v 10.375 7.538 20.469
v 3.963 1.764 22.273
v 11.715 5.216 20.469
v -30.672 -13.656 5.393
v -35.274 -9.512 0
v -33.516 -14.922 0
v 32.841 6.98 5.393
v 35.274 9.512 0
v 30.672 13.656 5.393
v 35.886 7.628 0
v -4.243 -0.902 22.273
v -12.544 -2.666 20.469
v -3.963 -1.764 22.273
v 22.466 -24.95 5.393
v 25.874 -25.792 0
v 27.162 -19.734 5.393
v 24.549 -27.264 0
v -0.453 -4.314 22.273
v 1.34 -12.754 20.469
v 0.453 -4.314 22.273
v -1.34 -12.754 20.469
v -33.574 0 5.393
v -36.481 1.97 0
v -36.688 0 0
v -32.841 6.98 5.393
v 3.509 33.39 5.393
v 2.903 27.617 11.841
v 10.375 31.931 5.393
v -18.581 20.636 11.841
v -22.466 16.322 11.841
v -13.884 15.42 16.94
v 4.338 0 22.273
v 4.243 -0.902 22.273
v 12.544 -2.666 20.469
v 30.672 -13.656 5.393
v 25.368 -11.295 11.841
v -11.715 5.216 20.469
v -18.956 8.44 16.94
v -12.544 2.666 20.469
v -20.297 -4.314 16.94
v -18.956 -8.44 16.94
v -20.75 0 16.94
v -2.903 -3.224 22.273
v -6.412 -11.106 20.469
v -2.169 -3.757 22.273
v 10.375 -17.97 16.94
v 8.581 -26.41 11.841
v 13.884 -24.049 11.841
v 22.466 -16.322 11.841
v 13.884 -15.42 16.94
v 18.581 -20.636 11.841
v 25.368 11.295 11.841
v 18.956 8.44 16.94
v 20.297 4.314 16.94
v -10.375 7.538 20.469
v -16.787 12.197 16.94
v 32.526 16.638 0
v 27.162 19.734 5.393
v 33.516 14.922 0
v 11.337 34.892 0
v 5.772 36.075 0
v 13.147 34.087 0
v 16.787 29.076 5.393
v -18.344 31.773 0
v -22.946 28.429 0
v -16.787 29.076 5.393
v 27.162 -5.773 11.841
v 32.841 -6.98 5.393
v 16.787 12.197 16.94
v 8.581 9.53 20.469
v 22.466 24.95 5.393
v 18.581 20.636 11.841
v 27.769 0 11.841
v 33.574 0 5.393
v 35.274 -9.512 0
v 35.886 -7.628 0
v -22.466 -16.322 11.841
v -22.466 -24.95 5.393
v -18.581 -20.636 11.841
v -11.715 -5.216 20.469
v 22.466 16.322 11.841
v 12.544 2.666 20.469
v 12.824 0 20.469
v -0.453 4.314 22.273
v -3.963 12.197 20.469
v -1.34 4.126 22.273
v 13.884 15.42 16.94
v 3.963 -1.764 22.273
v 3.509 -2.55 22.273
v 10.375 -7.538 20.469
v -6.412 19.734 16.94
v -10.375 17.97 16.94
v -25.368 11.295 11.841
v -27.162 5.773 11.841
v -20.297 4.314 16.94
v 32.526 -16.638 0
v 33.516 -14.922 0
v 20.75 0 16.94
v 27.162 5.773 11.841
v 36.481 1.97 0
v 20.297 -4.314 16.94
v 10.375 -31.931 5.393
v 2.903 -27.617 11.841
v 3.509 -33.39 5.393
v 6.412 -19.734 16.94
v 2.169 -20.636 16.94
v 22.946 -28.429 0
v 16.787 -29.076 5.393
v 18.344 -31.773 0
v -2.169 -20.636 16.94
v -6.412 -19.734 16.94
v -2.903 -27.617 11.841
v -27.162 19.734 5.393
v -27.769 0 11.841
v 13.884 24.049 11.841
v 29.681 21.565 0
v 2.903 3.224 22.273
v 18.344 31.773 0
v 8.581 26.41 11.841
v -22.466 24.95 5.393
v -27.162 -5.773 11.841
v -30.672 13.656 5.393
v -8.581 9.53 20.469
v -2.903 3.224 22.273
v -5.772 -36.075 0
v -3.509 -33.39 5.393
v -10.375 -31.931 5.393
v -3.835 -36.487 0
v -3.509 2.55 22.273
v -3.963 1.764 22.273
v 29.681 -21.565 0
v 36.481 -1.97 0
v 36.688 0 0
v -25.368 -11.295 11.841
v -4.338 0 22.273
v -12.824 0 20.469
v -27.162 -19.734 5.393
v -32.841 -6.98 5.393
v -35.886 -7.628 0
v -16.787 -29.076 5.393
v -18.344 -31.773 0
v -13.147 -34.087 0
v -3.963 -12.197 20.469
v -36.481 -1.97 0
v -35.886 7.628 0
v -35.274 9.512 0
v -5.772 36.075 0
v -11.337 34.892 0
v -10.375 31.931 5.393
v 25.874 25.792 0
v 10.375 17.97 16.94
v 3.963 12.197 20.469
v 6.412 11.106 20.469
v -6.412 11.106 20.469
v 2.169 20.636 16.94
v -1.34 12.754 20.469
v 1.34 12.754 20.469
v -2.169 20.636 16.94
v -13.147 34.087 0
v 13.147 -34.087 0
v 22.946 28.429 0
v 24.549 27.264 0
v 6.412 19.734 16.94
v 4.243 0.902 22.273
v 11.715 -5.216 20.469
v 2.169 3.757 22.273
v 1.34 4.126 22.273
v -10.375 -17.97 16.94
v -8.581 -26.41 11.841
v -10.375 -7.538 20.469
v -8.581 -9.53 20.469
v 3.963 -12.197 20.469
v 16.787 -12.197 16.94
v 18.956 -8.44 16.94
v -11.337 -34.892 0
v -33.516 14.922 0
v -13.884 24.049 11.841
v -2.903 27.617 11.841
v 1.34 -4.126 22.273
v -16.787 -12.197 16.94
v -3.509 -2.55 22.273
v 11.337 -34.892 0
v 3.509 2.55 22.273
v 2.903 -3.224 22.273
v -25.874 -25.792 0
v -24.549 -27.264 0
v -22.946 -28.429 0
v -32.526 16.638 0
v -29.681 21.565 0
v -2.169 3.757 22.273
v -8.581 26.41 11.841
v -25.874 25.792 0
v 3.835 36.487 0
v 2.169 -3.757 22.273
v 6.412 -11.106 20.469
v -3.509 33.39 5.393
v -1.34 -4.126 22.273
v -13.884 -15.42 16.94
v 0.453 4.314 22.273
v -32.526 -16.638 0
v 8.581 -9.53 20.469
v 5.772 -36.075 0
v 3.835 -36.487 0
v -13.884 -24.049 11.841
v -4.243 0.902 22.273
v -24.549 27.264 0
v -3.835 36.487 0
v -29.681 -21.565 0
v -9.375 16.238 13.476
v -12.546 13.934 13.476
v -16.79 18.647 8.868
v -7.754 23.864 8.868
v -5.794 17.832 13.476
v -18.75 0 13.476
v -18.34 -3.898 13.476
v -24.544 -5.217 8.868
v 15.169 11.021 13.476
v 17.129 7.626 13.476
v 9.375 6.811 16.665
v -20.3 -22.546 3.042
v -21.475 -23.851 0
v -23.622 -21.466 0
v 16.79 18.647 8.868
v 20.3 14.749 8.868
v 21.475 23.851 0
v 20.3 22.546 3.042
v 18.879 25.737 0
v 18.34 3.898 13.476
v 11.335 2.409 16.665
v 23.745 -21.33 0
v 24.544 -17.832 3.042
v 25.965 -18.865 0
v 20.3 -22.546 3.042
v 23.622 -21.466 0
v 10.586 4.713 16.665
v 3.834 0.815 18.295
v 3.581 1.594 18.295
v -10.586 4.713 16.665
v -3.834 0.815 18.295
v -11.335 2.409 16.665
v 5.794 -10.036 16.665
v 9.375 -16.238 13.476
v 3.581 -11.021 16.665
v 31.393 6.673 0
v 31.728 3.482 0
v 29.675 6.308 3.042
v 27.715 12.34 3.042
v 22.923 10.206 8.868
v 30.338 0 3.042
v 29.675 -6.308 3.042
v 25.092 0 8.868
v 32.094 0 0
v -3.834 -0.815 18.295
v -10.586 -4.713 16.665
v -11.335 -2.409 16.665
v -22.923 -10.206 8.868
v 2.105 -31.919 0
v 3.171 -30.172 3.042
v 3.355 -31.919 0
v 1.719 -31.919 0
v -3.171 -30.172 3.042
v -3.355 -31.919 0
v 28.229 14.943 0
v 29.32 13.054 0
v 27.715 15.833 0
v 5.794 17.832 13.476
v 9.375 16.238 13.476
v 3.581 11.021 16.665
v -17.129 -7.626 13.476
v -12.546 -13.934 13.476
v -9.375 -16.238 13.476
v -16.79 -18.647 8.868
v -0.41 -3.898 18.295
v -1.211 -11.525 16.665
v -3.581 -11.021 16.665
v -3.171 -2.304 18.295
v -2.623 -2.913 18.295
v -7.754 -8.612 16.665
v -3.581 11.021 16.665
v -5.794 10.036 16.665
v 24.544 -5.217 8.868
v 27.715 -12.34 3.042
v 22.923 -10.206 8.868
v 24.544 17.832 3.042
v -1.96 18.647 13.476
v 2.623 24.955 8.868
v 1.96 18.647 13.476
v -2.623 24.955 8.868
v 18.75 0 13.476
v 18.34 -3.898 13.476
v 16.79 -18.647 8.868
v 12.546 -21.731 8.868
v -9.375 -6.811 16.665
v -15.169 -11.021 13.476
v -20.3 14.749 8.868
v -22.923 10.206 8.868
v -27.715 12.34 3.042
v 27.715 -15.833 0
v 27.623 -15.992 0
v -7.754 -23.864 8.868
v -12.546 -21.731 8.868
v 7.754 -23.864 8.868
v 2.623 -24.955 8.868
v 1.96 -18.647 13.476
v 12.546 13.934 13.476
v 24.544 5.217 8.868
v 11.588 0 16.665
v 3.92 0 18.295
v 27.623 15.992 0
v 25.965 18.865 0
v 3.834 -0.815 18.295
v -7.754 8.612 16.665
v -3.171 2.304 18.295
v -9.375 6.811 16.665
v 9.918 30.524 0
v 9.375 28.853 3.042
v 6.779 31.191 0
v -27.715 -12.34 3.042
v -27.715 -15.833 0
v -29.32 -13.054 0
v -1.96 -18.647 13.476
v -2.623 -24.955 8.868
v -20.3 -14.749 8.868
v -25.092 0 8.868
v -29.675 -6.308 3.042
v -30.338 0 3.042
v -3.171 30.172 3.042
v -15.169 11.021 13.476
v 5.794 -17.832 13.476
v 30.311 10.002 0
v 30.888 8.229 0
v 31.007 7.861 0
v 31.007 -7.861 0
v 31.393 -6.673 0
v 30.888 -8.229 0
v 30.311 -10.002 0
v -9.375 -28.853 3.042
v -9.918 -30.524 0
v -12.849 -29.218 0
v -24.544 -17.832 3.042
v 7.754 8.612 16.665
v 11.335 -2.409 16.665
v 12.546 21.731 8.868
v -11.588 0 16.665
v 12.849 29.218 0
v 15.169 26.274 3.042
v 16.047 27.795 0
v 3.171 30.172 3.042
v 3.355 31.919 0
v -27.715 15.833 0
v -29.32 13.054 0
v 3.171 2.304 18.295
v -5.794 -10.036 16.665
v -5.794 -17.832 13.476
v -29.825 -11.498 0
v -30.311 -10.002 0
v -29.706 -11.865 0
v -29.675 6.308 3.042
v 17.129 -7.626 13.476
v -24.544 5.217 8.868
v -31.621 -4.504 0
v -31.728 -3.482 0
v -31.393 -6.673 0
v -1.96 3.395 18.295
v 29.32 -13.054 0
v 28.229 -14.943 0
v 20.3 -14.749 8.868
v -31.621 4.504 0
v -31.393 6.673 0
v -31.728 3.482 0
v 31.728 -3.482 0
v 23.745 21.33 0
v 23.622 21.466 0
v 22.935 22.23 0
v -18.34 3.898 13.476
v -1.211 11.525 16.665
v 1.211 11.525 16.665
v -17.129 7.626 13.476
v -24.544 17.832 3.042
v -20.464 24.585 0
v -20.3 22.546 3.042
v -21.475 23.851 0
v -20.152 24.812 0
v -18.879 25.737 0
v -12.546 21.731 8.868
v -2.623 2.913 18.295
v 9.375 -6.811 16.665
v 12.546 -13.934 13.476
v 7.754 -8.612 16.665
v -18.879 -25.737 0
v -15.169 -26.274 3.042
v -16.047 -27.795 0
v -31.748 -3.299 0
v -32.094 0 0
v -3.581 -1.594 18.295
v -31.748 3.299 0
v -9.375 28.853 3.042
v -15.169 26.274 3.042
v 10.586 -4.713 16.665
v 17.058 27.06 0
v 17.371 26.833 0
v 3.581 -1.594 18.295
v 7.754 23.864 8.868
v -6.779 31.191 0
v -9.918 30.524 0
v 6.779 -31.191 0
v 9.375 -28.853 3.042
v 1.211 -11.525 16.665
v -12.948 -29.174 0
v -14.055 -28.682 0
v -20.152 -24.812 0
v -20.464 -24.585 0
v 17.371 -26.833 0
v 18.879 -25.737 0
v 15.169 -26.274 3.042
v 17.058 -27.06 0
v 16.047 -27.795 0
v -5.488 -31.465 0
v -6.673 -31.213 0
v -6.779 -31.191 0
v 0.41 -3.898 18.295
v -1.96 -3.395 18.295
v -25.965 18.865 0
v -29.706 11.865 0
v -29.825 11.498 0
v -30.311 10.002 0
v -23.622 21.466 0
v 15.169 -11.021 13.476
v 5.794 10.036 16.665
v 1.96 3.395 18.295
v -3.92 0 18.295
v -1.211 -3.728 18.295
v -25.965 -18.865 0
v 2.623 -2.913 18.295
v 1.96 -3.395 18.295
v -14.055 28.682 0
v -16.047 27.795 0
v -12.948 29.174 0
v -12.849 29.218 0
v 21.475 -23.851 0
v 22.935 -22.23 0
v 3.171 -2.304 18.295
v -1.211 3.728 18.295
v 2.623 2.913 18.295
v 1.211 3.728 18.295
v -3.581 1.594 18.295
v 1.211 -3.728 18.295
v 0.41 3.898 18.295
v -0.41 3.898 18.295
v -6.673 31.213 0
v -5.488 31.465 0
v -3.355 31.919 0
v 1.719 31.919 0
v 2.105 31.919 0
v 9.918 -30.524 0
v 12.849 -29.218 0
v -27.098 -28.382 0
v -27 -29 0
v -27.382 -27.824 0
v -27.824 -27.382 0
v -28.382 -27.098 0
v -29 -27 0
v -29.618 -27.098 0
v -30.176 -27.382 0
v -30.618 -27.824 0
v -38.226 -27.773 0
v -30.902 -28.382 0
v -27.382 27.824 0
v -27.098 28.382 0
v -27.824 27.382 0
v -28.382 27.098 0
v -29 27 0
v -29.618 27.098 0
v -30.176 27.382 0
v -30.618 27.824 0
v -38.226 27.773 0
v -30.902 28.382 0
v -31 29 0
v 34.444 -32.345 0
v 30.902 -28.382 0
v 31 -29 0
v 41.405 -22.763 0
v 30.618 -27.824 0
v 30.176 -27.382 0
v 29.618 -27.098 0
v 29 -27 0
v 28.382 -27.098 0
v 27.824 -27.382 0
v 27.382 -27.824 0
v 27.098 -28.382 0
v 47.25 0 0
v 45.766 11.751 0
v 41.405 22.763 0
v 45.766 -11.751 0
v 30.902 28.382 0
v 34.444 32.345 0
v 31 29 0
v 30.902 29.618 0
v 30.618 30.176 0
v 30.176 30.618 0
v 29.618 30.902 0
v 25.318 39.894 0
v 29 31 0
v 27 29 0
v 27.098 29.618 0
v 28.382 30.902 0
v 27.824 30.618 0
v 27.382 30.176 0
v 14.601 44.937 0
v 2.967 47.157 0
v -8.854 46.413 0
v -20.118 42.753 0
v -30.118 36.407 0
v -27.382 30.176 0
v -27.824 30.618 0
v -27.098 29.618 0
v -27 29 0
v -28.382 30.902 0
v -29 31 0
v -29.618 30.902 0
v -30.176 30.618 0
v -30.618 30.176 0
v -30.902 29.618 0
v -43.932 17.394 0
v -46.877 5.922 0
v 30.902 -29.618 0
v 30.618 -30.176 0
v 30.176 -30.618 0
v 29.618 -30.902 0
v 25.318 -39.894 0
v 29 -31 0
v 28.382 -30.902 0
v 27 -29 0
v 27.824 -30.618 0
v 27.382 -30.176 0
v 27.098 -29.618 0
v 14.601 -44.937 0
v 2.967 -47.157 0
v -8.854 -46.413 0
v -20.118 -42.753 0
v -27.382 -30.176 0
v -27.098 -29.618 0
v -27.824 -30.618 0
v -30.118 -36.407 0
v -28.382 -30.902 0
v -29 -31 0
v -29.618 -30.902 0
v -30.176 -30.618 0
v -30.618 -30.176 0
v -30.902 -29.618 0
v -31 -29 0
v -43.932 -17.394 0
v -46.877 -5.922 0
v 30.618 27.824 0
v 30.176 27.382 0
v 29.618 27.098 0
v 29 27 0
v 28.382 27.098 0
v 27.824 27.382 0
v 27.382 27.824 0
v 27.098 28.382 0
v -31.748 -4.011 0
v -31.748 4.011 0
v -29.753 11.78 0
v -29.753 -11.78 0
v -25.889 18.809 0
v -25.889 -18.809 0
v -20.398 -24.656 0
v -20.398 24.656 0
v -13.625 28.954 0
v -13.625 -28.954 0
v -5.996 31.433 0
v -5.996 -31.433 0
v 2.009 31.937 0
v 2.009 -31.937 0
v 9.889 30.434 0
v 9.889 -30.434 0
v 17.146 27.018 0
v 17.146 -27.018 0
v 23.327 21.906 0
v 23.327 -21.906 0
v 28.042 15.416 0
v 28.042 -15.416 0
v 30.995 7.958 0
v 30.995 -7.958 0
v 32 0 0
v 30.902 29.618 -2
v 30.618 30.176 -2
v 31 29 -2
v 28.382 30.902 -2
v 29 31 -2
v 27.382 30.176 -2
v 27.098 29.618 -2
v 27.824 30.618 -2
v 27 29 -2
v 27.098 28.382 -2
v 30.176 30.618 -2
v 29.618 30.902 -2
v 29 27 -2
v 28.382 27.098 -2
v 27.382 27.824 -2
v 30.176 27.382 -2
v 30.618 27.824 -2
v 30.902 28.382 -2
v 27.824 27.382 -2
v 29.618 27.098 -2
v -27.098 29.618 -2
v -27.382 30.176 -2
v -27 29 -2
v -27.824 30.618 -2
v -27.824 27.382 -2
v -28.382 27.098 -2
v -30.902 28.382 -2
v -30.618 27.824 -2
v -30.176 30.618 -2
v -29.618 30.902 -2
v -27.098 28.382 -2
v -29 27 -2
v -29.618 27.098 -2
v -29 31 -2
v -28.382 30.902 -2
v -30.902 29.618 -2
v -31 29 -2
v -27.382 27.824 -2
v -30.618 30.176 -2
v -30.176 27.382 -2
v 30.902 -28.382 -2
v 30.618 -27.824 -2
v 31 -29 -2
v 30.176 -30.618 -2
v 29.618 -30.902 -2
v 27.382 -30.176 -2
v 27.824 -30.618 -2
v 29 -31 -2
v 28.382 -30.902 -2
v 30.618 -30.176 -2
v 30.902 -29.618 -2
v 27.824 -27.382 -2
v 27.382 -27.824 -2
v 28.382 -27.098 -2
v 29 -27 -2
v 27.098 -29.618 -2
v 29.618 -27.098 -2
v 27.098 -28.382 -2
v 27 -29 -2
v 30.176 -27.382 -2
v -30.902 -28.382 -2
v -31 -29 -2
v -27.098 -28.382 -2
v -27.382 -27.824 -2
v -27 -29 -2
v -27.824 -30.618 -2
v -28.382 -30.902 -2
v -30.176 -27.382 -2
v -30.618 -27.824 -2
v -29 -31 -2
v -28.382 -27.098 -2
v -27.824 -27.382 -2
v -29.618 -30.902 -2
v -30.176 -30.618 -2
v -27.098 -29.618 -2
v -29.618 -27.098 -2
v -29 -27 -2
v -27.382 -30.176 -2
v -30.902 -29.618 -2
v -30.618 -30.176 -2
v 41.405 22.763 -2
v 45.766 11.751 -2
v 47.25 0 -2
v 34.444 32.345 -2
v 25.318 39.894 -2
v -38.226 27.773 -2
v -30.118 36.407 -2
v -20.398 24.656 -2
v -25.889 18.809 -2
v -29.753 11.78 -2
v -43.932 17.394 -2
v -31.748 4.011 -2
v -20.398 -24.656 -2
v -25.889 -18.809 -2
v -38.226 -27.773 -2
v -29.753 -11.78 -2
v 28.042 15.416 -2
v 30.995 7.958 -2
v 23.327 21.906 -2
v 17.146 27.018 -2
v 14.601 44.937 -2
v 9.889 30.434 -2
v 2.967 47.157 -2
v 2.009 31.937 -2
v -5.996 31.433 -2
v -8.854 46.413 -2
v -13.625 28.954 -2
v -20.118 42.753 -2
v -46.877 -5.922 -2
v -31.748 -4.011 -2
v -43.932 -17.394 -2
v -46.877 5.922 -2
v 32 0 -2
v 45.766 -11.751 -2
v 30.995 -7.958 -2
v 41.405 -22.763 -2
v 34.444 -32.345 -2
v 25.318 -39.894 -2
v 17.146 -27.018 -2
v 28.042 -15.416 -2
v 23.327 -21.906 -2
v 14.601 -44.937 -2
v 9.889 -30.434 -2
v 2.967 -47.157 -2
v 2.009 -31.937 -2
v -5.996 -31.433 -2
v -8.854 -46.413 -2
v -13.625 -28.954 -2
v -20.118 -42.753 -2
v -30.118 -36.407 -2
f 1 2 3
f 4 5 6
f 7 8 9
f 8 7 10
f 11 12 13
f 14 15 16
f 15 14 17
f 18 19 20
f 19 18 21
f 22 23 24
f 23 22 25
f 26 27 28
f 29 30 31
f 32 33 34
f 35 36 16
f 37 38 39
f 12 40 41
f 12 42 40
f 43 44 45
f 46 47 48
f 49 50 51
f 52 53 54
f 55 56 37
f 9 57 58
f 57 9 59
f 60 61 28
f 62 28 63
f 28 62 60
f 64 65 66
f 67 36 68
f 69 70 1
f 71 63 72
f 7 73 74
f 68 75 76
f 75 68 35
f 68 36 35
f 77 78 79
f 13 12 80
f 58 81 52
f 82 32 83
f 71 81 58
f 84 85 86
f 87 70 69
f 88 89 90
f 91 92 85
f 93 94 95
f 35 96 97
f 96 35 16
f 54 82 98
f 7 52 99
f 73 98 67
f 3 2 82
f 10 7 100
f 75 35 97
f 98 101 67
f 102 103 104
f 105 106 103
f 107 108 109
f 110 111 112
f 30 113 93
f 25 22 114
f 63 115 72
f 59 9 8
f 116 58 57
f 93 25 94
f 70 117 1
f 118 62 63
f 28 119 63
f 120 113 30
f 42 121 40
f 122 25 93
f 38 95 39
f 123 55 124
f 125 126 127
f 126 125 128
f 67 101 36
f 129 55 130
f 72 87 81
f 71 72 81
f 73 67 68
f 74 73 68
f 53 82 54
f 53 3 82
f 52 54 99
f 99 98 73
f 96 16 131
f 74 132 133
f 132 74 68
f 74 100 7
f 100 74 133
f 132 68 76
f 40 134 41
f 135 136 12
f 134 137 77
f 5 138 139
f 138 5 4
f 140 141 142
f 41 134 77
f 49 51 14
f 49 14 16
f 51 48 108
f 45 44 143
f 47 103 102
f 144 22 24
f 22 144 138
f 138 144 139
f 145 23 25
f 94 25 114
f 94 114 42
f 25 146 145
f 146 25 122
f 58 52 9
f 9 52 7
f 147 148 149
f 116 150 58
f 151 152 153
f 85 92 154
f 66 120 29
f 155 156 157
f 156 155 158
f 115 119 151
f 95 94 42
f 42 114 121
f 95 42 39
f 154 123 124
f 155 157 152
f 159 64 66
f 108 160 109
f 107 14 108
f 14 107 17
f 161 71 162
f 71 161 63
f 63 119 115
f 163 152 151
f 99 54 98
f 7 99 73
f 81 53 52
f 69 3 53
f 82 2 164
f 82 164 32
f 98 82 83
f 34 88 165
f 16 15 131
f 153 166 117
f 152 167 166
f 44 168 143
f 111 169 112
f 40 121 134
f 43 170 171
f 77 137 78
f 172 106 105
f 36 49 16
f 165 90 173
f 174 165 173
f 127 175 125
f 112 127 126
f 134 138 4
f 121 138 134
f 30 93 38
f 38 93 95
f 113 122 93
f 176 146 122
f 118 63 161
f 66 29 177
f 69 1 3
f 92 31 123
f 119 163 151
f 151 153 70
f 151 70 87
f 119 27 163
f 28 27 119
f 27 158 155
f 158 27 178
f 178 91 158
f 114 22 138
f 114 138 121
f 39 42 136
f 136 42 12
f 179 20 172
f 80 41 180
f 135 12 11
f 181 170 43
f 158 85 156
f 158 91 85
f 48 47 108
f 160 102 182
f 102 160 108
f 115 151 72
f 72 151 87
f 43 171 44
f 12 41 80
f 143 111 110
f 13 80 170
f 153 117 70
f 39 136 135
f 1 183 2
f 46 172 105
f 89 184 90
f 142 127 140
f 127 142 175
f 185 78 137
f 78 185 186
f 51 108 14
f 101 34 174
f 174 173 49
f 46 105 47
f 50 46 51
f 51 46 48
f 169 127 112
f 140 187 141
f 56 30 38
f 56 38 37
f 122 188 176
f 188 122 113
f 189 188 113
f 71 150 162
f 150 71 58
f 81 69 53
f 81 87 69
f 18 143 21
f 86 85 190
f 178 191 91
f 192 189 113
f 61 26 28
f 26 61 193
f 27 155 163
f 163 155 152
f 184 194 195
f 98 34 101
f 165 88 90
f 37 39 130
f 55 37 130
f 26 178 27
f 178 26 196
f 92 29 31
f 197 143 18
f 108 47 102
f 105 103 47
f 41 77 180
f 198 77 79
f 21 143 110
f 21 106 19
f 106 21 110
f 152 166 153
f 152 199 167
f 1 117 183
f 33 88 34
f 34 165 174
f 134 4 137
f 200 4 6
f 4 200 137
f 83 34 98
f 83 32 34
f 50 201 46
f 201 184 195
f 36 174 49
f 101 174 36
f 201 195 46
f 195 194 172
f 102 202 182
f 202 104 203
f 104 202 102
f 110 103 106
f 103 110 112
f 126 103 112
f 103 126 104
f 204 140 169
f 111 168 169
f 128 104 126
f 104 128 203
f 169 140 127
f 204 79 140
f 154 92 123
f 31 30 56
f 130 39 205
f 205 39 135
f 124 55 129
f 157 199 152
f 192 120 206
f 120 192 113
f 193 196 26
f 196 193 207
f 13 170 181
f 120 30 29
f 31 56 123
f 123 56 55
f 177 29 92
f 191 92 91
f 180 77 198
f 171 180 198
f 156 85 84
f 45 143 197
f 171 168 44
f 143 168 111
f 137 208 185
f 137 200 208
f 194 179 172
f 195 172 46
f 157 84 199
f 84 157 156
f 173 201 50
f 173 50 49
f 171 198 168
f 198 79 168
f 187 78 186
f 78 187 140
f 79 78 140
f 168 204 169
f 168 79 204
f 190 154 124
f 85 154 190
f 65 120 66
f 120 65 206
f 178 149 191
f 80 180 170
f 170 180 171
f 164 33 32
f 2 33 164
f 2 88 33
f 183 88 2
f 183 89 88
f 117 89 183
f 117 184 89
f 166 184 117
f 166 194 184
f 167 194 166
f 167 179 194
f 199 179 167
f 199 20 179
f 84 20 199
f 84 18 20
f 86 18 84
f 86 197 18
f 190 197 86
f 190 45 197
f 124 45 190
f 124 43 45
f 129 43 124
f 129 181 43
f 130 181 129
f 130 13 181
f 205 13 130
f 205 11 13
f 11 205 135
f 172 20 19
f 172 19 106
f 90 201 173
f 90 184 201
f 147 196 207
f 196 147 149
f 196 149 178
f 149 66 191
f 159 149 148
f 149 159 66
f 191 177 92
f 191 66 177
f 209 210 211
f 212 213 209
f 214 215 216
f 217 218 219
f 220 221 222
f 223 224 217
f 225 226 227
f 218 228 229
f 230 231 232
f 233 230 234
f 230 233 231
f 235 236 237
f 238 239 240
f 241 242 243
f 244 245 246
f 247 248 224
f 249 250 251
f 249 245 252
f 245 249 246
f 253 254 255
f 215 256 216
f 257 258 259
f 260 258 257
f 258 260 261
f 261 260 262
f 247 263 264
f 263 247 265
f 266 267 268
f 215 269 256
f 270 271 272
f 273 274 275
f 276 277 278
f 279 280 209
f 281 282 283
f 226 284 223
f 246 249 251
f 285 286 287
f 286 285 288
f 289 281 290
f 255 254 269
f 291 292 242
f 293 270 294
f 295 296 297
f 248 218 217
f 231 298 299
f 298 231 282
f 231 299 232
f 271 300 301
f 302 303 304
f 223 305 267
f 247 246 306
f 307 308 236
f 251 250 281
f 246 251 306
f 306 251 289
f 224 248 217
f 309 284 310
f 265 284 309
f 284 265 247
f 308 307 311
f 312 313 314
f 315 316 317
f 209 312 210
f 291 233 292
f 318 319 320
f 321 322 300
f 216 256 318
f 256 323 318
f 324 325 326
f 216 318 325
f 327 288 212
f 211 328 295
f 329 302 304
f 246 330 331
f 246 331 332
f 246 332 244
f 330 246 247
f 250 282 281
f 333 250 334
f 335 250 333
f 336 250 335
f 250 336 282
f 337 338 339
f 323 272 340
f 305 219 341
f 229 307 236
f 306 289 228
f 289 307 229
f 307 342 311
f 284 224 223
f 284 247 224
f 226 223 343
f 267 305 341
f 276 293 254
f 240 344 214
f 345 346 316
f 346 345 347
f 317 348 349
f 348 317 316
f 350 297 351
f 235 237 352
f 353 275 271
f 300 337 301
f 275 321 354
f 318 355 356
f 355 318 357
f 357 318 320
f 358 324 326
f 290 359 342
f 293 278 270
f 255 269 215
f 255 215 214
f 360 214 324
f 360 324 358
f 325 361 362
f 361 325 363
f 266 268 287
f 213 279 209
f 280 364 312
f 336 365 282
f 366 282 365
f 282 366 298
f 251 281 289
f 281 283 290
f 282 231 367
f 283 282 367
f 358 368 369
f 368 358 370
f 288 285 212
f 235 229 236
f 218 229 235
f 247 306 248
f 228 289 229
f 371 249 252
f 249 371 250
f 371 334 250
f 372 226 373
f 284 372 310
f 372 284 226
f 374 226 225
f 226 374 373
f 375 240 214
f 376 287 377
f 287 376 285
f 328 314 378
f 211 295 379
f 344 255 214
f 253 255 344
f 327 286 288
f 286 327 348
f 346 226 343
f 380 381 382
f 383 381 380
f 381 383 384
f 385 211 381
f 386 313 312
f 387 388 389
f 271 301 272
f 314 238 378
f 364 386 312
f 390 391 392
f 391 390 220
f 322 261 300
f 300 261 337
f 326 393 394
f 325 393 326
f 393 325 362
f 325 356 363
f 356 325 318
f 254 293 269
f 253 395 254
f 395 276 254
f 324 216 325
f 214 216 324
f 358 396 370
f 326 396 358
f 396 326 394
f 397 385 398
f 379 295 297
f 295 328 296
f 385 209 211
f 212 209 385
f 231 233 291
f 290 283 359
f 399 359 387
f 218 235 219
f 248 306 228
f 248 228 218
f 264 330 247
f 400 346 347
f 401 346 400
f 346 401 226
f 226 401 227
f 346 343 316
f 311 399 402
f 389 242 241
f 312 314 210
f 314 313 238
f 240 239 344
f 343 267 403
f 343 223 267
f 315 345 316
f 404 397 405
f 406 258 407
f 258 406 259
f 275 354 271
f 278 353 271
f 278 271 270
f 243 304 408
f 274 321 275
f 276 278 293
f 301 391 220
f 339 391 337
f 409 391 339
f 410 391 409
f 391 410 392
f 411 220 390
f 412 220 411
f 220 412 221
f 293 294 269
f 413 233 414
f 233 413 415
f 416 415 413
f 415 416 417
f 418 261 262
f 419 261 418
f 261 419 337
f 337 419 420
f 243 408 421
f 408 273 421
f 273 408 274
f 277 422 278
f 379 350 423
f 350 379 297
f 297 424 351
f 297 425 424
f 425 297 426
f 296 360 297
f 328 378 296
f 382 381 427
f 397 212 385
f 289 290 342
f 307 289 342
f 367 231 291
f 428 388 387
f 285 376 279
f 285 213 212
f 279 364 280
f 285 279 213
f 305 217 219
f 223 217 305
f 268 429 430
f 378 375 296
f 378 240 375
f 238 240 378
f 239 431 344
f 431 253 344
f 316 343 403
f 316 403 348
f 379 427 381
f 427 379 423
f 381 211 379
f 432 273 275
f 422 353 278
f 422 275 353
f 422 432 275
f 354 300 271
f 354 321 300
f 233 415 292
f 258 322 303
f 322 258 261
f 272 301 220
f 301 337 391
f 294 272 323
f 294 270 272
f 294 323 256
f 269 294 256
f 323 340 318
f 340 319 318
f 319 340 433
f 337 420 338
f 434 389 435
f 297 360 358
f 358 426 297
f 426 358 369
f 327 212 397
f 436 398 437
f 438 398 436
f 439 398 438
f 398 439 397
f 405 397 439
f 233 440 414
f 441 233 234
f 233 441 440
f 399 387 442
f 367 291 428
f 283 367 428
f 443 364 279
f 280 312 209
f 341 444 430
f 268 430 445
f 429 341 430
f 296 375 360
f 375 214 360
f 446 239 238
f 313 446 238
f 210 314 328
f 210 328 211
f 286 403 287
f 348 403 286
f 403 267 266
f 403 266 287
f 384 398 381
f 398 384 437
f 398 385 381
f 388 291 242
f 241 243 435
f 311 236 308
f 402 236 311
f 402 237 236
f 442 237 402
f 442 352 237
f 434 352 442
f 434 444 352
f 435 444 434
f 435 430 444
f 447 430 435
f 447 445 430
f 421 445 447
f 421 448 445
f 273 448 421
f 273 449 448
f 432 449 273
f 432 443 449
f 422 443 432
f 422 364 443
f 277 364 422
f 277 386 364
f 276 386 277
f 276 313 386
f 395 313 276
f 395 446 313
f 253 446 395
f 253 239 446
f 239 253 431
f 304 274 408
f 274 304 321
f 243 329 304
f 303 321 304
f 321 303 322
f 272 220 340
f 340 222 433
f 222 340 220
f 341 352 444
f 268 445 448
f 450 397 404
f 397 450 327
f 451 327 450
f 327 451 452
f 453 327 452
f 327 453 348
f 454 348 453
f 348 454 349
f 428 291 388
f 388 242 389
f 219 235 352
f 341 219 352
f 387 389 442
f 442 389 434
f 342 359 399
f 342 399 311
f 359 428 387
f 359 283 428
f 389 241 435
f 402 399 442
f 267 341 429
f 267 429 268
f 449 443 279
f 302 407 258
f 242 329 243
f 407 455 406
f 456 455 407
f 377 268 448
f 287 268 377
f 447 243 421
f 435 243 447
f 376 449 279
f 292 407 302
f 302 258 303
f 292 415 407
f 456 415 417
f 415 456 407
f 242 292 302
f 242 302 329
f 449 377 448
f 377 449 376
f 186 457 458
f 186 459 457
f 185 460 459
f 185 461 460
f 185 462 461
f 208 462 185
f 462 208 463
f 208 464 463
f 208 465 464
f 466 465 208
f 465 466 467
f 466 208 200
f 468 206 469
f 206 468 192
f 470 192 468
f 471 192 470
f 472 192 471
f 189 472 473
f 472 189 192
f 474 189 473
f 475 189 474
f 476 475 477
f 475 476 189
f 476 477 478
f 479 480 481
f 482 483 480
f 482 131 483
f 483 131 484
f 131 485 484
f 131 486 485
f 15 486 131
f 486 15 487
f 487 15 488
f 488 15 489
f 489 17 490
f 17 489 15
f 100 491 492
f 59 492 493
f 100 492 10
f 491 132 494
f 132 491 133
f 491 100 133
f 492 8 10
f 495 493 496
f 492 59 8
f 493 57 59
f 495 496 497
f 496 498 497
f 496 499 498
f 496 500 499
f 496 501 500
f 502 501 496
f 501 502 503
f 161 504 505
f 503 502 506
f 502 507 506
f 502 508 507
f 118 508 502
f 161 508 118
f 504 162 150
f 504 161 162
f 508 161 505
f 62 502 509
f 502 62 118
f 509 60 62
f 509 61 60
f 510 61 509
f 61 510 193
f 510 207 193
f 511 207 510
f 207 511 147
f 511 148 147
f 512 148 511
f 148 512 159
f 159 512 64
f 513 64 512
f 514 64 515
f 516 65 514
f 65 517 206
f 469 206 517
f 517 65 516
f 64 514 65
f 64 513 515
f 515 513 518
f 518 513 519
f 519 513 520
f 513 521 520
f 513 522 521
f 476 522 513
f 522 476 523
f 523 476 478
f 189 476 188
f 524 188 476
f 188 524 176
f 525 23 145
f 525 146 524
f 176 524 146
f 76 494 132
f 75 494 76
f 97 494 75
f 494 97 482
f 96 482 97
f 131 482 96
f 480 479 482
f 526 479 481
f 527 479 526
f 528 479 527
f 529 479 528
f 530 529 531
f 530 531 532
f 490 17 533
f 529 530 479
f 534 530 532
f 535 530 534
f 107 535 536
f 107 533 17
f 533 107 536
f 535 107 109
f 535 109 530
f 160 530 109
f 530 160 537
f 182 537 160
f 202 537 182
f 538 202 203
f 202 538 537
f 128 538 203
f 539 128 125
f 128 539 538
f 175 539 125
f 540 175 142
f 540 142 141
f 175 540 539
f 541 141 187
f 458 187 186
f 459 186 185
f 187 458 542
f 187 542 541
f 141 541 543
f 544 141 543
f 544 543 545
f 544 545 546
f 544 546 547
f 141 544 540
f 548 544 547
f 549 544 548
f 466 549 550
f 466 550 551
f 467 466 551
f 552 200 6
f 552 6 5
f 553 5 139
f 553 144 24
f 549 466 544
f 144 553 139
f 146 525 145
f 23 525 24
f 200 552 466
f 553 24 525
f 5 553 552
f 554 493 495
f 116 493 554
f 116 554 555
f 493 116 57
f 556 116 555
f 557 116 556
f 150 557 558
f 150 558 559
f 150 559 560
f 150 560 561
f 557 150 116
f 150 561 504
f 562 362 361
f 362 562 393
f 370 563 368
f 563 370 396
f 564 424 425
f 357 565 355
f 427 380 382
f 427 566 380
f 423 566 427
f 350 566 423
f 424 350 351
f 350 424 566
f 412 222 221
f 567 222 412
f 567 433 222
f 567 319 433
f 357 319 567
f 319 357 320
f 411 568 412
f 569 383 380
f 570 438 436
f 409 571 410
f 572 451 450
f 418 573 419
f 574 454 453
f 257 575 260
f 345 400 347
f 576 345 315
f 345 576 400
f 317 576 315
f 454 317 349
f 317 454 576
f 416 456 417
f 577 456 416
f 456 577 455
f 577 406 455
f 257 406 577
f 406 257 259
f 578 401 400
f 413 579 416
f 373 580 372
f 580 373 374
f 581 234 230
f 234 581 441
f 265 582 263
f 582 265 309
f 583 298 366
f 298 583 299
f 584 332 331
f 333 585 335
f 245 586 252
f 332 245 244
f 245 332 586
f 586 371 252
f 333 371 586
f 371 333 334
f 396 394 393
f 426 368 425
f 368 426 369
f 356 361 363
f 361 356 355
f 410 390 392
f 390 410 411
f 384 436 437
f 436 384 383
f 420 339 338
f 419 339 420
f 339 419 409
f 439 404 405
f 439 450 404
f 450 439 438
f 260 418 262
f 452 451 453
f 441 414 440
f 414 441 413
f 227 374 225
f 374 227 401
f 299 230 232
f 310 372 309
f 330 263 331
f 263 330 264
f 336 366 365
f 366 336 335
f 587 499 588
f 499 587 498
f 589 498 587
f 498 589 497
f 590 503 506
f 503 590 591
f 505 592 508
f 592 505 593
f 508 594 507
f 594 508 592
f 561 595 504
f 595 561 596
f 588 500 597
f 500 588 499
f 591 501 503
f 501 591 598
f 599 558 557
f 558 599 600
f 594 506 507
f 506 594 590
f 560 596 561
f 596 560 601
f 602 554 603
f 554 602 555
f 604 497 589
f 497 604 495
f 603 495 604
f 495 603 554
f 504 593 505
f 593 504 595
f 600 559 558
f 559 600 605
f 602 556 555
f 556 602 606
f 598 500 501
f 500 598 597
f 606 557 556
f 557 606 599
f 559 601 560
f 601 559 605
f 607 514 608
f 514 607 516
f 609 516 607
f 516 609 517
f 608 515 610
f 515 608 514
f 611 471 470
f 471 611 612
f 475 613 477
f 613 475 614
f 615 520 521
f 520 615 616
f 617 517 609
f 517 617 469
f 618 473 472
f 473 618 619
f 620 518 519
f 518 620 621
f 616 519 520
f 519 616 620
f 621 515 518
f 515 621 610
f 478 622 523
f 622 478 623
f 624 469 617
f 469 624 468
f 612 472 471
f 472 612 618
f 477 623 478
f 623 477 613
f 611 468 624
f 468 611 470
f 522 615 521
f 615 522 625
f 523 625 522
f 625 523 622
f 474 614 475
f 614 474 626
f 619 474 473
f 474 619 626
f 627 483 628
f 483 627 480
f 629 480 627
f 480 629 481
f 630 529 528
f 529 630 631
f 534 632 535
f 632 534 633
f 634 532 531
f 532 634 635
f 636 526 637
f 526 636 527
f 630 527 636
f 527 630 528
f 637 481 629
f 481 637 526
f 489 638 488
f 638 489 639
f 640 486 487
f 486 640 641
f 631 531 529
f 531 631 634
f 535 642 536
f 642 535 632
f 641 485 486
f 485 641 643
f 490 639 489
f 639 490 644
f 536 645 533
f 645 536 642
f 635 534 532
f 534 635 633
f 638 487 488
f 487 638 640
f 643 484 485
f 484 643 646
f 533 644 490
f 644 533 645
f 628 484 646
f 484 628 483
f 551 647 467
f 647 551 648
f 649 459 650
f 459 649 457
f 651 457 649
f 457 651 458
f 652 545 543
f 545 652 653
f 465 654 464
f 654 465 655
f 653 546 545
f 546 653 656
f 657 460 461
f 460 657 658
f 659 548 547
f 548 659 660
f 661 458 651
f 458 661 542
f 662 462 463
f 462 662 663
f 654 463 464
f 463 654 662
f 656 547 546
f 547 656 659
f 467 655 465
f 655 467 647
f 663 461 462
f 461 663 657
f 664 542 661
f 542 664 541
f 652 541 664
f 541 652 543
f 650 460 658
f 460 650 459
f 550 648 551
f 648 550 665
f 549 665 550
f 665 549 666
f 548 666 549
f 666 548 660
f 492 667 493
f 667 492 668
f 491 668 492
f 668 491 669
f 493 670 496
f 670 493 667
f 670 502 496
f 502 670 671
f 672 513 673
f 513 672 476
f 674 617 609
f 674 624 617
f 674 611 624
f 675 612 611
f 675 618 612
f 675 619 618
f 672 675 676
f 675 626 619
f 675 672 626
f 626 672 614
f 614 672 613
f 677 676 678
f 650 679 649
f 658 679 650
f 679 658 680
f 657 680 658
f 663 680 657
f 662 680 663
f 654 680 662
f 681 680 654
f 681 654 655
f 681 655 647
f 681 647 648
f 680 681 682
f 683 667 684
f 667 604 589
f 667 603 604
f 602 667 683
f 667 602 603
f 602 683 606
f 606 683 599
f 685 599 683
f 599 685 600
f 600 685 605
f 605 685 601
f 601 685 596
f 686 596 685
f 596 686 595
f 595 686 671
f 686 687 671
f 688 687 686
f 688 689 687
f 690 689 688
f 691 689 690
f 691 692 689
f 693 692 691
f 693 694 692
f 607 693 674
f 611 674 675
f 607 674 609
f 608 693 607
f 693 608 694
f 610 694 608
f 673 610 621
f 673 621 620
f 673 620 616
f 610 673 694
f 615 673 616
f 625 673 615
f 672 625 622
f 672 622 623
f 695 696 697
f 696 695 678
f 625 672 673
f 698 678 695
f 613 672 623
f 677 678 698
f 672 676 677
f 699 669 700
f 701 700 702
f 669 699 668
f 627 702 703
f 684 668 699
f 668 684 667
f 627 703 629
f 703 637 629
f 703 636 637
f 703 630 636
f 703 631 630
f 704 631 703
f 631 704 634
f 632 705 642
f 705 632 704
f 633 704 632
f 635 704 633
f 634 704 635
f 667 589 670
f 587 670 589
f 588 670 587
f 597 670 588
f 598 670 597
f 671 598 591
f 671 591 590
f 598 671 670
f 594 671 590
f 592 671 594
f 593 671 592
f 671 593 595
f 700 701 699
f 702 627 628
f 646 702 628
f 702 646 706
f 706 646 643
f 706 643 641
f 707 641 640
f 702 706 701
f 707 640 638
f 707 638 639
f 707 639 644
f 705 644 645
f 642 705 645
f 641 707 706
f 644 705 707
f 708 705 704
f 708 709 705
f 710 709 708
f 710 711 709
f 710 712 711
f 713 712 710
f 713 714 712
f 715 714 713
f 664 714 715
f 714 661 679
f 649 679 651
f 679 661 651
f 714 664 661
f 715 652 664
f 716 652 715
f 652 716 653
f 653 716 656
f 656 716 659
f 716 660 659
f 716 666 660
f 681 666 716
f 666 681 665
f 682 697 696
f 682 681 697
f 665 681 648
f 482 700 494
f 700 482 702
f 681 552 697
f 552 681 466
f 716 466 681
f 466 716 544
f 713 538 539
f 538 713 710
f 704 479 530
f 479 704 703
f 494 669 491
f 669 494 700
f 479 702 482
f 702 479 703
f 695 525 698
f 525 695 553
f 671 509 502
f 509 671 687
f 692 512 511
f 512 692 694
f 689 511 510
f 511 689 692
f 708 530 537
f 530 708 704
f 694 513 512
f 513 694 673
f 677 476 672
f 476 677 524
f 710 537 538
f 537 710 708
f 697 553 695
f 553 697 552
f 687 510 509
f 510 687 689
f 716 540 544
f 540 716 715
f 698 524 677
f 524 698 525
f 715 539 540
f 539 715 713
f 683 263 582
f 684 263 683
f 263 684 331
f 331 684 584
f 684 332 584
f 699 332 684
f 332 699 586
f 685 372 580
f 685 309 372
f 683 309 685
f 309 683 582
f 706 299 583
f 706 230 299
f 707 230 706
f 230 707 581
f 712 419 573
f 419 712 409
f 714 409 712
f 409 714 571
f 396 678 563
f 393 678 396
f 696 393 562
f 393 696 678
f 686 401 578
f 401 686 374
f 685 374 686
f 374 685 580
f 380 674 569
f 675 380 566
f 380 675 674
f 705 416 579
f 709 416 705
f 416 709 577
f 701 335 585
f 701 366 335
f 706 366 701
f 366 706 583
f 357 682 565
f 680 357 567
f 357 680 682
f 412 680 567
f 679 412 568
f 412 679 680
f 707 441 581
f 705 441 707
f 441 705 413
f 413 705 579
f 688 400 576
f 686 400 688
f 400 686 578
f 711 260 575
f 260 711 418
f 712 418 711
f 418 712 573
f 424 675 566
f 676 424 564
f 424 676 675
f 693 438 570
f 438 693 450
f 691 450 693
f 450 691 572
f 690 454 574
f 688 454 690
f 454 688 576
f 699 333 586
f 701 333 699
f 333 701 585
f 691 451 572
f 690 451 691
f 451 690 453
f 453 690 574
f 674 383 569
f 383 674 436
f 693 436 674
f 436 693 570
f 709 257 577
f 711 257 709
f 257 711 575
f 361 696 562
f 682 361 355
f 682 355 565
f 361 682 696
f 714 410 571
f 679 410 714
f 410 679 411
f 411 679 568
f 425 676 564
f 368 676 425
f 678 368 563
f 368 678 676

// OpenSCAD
diametro_esfera = 83;

diametro_esfera_vaciar = 75;

diametro_cilindro_sobrante = 100;
altura_cilindro_sobrante = 83;

altura_cilindro_base = 2;
diametro_cilindro_base = 94.5;

altura_cilindro_vaciar = 5;
diametro_cilindro_vaciar = 64;

diametro_agujerpos_base = 4;
altura_agujeros_base = 10;

union(){
quitarSobranteEsfera();
translate([0,0,-2])
vaciarBase();

}

module crearEsfera(){
    translate([0,0,-19])
sphere(d = diametro_esfera,center = true, $fn = 30);
}

module crearEsferaVaciar(){
    translate([0,0,-19])
    color("red")
sphere(d = diametro_esfera_vaciar,center = true, $fn = 30);
}

module vaciarEsfera(){
    difference(){
        crearEsfera();
        crearEsferaVaciar();
    }
}

module quitarSobranteEsfera(){
    difference(){
        vaciarEsfera();
        translate([0,0,-50])
            cylinder(h=diametro_cilindro_sobrante,d=altura_cilindro_sobrante,center = true);
    }
}


module crearBase(){
   translate([0,0,1])
        cylinder(h=altura_cilindro_base,d=diametro_cilindro_base,center = true,$fn = 25);
}

module cilindroVaciarBase(){
    cylinder(h=altura_cilindro_vaciar,d=diametro_cilindro_vaciar,center = true,$fn = 25);
}

module vaciarBase(){
    difference(){
        crearBase();
        cilindroVaciarBase();
        hacer_agujeros_base();
    }
}

module hacer_agujeros_base(){
    translate([29,29,0])
color("red")
cylinder(h=10,d=4,center = true,$fn=20);
    
    translate([-29,29,0])
color("red")
cylinder(h=10,d=4,center = true,$fn=20);
    
        translate([29,-29,0])
color("red")
cylinder(h=10,d=4,center = true,$fn=20);
    
    translate([-29,-29,0])
color("red")
cylinder(h=10,d=4,center = true,$fn=20);
}
